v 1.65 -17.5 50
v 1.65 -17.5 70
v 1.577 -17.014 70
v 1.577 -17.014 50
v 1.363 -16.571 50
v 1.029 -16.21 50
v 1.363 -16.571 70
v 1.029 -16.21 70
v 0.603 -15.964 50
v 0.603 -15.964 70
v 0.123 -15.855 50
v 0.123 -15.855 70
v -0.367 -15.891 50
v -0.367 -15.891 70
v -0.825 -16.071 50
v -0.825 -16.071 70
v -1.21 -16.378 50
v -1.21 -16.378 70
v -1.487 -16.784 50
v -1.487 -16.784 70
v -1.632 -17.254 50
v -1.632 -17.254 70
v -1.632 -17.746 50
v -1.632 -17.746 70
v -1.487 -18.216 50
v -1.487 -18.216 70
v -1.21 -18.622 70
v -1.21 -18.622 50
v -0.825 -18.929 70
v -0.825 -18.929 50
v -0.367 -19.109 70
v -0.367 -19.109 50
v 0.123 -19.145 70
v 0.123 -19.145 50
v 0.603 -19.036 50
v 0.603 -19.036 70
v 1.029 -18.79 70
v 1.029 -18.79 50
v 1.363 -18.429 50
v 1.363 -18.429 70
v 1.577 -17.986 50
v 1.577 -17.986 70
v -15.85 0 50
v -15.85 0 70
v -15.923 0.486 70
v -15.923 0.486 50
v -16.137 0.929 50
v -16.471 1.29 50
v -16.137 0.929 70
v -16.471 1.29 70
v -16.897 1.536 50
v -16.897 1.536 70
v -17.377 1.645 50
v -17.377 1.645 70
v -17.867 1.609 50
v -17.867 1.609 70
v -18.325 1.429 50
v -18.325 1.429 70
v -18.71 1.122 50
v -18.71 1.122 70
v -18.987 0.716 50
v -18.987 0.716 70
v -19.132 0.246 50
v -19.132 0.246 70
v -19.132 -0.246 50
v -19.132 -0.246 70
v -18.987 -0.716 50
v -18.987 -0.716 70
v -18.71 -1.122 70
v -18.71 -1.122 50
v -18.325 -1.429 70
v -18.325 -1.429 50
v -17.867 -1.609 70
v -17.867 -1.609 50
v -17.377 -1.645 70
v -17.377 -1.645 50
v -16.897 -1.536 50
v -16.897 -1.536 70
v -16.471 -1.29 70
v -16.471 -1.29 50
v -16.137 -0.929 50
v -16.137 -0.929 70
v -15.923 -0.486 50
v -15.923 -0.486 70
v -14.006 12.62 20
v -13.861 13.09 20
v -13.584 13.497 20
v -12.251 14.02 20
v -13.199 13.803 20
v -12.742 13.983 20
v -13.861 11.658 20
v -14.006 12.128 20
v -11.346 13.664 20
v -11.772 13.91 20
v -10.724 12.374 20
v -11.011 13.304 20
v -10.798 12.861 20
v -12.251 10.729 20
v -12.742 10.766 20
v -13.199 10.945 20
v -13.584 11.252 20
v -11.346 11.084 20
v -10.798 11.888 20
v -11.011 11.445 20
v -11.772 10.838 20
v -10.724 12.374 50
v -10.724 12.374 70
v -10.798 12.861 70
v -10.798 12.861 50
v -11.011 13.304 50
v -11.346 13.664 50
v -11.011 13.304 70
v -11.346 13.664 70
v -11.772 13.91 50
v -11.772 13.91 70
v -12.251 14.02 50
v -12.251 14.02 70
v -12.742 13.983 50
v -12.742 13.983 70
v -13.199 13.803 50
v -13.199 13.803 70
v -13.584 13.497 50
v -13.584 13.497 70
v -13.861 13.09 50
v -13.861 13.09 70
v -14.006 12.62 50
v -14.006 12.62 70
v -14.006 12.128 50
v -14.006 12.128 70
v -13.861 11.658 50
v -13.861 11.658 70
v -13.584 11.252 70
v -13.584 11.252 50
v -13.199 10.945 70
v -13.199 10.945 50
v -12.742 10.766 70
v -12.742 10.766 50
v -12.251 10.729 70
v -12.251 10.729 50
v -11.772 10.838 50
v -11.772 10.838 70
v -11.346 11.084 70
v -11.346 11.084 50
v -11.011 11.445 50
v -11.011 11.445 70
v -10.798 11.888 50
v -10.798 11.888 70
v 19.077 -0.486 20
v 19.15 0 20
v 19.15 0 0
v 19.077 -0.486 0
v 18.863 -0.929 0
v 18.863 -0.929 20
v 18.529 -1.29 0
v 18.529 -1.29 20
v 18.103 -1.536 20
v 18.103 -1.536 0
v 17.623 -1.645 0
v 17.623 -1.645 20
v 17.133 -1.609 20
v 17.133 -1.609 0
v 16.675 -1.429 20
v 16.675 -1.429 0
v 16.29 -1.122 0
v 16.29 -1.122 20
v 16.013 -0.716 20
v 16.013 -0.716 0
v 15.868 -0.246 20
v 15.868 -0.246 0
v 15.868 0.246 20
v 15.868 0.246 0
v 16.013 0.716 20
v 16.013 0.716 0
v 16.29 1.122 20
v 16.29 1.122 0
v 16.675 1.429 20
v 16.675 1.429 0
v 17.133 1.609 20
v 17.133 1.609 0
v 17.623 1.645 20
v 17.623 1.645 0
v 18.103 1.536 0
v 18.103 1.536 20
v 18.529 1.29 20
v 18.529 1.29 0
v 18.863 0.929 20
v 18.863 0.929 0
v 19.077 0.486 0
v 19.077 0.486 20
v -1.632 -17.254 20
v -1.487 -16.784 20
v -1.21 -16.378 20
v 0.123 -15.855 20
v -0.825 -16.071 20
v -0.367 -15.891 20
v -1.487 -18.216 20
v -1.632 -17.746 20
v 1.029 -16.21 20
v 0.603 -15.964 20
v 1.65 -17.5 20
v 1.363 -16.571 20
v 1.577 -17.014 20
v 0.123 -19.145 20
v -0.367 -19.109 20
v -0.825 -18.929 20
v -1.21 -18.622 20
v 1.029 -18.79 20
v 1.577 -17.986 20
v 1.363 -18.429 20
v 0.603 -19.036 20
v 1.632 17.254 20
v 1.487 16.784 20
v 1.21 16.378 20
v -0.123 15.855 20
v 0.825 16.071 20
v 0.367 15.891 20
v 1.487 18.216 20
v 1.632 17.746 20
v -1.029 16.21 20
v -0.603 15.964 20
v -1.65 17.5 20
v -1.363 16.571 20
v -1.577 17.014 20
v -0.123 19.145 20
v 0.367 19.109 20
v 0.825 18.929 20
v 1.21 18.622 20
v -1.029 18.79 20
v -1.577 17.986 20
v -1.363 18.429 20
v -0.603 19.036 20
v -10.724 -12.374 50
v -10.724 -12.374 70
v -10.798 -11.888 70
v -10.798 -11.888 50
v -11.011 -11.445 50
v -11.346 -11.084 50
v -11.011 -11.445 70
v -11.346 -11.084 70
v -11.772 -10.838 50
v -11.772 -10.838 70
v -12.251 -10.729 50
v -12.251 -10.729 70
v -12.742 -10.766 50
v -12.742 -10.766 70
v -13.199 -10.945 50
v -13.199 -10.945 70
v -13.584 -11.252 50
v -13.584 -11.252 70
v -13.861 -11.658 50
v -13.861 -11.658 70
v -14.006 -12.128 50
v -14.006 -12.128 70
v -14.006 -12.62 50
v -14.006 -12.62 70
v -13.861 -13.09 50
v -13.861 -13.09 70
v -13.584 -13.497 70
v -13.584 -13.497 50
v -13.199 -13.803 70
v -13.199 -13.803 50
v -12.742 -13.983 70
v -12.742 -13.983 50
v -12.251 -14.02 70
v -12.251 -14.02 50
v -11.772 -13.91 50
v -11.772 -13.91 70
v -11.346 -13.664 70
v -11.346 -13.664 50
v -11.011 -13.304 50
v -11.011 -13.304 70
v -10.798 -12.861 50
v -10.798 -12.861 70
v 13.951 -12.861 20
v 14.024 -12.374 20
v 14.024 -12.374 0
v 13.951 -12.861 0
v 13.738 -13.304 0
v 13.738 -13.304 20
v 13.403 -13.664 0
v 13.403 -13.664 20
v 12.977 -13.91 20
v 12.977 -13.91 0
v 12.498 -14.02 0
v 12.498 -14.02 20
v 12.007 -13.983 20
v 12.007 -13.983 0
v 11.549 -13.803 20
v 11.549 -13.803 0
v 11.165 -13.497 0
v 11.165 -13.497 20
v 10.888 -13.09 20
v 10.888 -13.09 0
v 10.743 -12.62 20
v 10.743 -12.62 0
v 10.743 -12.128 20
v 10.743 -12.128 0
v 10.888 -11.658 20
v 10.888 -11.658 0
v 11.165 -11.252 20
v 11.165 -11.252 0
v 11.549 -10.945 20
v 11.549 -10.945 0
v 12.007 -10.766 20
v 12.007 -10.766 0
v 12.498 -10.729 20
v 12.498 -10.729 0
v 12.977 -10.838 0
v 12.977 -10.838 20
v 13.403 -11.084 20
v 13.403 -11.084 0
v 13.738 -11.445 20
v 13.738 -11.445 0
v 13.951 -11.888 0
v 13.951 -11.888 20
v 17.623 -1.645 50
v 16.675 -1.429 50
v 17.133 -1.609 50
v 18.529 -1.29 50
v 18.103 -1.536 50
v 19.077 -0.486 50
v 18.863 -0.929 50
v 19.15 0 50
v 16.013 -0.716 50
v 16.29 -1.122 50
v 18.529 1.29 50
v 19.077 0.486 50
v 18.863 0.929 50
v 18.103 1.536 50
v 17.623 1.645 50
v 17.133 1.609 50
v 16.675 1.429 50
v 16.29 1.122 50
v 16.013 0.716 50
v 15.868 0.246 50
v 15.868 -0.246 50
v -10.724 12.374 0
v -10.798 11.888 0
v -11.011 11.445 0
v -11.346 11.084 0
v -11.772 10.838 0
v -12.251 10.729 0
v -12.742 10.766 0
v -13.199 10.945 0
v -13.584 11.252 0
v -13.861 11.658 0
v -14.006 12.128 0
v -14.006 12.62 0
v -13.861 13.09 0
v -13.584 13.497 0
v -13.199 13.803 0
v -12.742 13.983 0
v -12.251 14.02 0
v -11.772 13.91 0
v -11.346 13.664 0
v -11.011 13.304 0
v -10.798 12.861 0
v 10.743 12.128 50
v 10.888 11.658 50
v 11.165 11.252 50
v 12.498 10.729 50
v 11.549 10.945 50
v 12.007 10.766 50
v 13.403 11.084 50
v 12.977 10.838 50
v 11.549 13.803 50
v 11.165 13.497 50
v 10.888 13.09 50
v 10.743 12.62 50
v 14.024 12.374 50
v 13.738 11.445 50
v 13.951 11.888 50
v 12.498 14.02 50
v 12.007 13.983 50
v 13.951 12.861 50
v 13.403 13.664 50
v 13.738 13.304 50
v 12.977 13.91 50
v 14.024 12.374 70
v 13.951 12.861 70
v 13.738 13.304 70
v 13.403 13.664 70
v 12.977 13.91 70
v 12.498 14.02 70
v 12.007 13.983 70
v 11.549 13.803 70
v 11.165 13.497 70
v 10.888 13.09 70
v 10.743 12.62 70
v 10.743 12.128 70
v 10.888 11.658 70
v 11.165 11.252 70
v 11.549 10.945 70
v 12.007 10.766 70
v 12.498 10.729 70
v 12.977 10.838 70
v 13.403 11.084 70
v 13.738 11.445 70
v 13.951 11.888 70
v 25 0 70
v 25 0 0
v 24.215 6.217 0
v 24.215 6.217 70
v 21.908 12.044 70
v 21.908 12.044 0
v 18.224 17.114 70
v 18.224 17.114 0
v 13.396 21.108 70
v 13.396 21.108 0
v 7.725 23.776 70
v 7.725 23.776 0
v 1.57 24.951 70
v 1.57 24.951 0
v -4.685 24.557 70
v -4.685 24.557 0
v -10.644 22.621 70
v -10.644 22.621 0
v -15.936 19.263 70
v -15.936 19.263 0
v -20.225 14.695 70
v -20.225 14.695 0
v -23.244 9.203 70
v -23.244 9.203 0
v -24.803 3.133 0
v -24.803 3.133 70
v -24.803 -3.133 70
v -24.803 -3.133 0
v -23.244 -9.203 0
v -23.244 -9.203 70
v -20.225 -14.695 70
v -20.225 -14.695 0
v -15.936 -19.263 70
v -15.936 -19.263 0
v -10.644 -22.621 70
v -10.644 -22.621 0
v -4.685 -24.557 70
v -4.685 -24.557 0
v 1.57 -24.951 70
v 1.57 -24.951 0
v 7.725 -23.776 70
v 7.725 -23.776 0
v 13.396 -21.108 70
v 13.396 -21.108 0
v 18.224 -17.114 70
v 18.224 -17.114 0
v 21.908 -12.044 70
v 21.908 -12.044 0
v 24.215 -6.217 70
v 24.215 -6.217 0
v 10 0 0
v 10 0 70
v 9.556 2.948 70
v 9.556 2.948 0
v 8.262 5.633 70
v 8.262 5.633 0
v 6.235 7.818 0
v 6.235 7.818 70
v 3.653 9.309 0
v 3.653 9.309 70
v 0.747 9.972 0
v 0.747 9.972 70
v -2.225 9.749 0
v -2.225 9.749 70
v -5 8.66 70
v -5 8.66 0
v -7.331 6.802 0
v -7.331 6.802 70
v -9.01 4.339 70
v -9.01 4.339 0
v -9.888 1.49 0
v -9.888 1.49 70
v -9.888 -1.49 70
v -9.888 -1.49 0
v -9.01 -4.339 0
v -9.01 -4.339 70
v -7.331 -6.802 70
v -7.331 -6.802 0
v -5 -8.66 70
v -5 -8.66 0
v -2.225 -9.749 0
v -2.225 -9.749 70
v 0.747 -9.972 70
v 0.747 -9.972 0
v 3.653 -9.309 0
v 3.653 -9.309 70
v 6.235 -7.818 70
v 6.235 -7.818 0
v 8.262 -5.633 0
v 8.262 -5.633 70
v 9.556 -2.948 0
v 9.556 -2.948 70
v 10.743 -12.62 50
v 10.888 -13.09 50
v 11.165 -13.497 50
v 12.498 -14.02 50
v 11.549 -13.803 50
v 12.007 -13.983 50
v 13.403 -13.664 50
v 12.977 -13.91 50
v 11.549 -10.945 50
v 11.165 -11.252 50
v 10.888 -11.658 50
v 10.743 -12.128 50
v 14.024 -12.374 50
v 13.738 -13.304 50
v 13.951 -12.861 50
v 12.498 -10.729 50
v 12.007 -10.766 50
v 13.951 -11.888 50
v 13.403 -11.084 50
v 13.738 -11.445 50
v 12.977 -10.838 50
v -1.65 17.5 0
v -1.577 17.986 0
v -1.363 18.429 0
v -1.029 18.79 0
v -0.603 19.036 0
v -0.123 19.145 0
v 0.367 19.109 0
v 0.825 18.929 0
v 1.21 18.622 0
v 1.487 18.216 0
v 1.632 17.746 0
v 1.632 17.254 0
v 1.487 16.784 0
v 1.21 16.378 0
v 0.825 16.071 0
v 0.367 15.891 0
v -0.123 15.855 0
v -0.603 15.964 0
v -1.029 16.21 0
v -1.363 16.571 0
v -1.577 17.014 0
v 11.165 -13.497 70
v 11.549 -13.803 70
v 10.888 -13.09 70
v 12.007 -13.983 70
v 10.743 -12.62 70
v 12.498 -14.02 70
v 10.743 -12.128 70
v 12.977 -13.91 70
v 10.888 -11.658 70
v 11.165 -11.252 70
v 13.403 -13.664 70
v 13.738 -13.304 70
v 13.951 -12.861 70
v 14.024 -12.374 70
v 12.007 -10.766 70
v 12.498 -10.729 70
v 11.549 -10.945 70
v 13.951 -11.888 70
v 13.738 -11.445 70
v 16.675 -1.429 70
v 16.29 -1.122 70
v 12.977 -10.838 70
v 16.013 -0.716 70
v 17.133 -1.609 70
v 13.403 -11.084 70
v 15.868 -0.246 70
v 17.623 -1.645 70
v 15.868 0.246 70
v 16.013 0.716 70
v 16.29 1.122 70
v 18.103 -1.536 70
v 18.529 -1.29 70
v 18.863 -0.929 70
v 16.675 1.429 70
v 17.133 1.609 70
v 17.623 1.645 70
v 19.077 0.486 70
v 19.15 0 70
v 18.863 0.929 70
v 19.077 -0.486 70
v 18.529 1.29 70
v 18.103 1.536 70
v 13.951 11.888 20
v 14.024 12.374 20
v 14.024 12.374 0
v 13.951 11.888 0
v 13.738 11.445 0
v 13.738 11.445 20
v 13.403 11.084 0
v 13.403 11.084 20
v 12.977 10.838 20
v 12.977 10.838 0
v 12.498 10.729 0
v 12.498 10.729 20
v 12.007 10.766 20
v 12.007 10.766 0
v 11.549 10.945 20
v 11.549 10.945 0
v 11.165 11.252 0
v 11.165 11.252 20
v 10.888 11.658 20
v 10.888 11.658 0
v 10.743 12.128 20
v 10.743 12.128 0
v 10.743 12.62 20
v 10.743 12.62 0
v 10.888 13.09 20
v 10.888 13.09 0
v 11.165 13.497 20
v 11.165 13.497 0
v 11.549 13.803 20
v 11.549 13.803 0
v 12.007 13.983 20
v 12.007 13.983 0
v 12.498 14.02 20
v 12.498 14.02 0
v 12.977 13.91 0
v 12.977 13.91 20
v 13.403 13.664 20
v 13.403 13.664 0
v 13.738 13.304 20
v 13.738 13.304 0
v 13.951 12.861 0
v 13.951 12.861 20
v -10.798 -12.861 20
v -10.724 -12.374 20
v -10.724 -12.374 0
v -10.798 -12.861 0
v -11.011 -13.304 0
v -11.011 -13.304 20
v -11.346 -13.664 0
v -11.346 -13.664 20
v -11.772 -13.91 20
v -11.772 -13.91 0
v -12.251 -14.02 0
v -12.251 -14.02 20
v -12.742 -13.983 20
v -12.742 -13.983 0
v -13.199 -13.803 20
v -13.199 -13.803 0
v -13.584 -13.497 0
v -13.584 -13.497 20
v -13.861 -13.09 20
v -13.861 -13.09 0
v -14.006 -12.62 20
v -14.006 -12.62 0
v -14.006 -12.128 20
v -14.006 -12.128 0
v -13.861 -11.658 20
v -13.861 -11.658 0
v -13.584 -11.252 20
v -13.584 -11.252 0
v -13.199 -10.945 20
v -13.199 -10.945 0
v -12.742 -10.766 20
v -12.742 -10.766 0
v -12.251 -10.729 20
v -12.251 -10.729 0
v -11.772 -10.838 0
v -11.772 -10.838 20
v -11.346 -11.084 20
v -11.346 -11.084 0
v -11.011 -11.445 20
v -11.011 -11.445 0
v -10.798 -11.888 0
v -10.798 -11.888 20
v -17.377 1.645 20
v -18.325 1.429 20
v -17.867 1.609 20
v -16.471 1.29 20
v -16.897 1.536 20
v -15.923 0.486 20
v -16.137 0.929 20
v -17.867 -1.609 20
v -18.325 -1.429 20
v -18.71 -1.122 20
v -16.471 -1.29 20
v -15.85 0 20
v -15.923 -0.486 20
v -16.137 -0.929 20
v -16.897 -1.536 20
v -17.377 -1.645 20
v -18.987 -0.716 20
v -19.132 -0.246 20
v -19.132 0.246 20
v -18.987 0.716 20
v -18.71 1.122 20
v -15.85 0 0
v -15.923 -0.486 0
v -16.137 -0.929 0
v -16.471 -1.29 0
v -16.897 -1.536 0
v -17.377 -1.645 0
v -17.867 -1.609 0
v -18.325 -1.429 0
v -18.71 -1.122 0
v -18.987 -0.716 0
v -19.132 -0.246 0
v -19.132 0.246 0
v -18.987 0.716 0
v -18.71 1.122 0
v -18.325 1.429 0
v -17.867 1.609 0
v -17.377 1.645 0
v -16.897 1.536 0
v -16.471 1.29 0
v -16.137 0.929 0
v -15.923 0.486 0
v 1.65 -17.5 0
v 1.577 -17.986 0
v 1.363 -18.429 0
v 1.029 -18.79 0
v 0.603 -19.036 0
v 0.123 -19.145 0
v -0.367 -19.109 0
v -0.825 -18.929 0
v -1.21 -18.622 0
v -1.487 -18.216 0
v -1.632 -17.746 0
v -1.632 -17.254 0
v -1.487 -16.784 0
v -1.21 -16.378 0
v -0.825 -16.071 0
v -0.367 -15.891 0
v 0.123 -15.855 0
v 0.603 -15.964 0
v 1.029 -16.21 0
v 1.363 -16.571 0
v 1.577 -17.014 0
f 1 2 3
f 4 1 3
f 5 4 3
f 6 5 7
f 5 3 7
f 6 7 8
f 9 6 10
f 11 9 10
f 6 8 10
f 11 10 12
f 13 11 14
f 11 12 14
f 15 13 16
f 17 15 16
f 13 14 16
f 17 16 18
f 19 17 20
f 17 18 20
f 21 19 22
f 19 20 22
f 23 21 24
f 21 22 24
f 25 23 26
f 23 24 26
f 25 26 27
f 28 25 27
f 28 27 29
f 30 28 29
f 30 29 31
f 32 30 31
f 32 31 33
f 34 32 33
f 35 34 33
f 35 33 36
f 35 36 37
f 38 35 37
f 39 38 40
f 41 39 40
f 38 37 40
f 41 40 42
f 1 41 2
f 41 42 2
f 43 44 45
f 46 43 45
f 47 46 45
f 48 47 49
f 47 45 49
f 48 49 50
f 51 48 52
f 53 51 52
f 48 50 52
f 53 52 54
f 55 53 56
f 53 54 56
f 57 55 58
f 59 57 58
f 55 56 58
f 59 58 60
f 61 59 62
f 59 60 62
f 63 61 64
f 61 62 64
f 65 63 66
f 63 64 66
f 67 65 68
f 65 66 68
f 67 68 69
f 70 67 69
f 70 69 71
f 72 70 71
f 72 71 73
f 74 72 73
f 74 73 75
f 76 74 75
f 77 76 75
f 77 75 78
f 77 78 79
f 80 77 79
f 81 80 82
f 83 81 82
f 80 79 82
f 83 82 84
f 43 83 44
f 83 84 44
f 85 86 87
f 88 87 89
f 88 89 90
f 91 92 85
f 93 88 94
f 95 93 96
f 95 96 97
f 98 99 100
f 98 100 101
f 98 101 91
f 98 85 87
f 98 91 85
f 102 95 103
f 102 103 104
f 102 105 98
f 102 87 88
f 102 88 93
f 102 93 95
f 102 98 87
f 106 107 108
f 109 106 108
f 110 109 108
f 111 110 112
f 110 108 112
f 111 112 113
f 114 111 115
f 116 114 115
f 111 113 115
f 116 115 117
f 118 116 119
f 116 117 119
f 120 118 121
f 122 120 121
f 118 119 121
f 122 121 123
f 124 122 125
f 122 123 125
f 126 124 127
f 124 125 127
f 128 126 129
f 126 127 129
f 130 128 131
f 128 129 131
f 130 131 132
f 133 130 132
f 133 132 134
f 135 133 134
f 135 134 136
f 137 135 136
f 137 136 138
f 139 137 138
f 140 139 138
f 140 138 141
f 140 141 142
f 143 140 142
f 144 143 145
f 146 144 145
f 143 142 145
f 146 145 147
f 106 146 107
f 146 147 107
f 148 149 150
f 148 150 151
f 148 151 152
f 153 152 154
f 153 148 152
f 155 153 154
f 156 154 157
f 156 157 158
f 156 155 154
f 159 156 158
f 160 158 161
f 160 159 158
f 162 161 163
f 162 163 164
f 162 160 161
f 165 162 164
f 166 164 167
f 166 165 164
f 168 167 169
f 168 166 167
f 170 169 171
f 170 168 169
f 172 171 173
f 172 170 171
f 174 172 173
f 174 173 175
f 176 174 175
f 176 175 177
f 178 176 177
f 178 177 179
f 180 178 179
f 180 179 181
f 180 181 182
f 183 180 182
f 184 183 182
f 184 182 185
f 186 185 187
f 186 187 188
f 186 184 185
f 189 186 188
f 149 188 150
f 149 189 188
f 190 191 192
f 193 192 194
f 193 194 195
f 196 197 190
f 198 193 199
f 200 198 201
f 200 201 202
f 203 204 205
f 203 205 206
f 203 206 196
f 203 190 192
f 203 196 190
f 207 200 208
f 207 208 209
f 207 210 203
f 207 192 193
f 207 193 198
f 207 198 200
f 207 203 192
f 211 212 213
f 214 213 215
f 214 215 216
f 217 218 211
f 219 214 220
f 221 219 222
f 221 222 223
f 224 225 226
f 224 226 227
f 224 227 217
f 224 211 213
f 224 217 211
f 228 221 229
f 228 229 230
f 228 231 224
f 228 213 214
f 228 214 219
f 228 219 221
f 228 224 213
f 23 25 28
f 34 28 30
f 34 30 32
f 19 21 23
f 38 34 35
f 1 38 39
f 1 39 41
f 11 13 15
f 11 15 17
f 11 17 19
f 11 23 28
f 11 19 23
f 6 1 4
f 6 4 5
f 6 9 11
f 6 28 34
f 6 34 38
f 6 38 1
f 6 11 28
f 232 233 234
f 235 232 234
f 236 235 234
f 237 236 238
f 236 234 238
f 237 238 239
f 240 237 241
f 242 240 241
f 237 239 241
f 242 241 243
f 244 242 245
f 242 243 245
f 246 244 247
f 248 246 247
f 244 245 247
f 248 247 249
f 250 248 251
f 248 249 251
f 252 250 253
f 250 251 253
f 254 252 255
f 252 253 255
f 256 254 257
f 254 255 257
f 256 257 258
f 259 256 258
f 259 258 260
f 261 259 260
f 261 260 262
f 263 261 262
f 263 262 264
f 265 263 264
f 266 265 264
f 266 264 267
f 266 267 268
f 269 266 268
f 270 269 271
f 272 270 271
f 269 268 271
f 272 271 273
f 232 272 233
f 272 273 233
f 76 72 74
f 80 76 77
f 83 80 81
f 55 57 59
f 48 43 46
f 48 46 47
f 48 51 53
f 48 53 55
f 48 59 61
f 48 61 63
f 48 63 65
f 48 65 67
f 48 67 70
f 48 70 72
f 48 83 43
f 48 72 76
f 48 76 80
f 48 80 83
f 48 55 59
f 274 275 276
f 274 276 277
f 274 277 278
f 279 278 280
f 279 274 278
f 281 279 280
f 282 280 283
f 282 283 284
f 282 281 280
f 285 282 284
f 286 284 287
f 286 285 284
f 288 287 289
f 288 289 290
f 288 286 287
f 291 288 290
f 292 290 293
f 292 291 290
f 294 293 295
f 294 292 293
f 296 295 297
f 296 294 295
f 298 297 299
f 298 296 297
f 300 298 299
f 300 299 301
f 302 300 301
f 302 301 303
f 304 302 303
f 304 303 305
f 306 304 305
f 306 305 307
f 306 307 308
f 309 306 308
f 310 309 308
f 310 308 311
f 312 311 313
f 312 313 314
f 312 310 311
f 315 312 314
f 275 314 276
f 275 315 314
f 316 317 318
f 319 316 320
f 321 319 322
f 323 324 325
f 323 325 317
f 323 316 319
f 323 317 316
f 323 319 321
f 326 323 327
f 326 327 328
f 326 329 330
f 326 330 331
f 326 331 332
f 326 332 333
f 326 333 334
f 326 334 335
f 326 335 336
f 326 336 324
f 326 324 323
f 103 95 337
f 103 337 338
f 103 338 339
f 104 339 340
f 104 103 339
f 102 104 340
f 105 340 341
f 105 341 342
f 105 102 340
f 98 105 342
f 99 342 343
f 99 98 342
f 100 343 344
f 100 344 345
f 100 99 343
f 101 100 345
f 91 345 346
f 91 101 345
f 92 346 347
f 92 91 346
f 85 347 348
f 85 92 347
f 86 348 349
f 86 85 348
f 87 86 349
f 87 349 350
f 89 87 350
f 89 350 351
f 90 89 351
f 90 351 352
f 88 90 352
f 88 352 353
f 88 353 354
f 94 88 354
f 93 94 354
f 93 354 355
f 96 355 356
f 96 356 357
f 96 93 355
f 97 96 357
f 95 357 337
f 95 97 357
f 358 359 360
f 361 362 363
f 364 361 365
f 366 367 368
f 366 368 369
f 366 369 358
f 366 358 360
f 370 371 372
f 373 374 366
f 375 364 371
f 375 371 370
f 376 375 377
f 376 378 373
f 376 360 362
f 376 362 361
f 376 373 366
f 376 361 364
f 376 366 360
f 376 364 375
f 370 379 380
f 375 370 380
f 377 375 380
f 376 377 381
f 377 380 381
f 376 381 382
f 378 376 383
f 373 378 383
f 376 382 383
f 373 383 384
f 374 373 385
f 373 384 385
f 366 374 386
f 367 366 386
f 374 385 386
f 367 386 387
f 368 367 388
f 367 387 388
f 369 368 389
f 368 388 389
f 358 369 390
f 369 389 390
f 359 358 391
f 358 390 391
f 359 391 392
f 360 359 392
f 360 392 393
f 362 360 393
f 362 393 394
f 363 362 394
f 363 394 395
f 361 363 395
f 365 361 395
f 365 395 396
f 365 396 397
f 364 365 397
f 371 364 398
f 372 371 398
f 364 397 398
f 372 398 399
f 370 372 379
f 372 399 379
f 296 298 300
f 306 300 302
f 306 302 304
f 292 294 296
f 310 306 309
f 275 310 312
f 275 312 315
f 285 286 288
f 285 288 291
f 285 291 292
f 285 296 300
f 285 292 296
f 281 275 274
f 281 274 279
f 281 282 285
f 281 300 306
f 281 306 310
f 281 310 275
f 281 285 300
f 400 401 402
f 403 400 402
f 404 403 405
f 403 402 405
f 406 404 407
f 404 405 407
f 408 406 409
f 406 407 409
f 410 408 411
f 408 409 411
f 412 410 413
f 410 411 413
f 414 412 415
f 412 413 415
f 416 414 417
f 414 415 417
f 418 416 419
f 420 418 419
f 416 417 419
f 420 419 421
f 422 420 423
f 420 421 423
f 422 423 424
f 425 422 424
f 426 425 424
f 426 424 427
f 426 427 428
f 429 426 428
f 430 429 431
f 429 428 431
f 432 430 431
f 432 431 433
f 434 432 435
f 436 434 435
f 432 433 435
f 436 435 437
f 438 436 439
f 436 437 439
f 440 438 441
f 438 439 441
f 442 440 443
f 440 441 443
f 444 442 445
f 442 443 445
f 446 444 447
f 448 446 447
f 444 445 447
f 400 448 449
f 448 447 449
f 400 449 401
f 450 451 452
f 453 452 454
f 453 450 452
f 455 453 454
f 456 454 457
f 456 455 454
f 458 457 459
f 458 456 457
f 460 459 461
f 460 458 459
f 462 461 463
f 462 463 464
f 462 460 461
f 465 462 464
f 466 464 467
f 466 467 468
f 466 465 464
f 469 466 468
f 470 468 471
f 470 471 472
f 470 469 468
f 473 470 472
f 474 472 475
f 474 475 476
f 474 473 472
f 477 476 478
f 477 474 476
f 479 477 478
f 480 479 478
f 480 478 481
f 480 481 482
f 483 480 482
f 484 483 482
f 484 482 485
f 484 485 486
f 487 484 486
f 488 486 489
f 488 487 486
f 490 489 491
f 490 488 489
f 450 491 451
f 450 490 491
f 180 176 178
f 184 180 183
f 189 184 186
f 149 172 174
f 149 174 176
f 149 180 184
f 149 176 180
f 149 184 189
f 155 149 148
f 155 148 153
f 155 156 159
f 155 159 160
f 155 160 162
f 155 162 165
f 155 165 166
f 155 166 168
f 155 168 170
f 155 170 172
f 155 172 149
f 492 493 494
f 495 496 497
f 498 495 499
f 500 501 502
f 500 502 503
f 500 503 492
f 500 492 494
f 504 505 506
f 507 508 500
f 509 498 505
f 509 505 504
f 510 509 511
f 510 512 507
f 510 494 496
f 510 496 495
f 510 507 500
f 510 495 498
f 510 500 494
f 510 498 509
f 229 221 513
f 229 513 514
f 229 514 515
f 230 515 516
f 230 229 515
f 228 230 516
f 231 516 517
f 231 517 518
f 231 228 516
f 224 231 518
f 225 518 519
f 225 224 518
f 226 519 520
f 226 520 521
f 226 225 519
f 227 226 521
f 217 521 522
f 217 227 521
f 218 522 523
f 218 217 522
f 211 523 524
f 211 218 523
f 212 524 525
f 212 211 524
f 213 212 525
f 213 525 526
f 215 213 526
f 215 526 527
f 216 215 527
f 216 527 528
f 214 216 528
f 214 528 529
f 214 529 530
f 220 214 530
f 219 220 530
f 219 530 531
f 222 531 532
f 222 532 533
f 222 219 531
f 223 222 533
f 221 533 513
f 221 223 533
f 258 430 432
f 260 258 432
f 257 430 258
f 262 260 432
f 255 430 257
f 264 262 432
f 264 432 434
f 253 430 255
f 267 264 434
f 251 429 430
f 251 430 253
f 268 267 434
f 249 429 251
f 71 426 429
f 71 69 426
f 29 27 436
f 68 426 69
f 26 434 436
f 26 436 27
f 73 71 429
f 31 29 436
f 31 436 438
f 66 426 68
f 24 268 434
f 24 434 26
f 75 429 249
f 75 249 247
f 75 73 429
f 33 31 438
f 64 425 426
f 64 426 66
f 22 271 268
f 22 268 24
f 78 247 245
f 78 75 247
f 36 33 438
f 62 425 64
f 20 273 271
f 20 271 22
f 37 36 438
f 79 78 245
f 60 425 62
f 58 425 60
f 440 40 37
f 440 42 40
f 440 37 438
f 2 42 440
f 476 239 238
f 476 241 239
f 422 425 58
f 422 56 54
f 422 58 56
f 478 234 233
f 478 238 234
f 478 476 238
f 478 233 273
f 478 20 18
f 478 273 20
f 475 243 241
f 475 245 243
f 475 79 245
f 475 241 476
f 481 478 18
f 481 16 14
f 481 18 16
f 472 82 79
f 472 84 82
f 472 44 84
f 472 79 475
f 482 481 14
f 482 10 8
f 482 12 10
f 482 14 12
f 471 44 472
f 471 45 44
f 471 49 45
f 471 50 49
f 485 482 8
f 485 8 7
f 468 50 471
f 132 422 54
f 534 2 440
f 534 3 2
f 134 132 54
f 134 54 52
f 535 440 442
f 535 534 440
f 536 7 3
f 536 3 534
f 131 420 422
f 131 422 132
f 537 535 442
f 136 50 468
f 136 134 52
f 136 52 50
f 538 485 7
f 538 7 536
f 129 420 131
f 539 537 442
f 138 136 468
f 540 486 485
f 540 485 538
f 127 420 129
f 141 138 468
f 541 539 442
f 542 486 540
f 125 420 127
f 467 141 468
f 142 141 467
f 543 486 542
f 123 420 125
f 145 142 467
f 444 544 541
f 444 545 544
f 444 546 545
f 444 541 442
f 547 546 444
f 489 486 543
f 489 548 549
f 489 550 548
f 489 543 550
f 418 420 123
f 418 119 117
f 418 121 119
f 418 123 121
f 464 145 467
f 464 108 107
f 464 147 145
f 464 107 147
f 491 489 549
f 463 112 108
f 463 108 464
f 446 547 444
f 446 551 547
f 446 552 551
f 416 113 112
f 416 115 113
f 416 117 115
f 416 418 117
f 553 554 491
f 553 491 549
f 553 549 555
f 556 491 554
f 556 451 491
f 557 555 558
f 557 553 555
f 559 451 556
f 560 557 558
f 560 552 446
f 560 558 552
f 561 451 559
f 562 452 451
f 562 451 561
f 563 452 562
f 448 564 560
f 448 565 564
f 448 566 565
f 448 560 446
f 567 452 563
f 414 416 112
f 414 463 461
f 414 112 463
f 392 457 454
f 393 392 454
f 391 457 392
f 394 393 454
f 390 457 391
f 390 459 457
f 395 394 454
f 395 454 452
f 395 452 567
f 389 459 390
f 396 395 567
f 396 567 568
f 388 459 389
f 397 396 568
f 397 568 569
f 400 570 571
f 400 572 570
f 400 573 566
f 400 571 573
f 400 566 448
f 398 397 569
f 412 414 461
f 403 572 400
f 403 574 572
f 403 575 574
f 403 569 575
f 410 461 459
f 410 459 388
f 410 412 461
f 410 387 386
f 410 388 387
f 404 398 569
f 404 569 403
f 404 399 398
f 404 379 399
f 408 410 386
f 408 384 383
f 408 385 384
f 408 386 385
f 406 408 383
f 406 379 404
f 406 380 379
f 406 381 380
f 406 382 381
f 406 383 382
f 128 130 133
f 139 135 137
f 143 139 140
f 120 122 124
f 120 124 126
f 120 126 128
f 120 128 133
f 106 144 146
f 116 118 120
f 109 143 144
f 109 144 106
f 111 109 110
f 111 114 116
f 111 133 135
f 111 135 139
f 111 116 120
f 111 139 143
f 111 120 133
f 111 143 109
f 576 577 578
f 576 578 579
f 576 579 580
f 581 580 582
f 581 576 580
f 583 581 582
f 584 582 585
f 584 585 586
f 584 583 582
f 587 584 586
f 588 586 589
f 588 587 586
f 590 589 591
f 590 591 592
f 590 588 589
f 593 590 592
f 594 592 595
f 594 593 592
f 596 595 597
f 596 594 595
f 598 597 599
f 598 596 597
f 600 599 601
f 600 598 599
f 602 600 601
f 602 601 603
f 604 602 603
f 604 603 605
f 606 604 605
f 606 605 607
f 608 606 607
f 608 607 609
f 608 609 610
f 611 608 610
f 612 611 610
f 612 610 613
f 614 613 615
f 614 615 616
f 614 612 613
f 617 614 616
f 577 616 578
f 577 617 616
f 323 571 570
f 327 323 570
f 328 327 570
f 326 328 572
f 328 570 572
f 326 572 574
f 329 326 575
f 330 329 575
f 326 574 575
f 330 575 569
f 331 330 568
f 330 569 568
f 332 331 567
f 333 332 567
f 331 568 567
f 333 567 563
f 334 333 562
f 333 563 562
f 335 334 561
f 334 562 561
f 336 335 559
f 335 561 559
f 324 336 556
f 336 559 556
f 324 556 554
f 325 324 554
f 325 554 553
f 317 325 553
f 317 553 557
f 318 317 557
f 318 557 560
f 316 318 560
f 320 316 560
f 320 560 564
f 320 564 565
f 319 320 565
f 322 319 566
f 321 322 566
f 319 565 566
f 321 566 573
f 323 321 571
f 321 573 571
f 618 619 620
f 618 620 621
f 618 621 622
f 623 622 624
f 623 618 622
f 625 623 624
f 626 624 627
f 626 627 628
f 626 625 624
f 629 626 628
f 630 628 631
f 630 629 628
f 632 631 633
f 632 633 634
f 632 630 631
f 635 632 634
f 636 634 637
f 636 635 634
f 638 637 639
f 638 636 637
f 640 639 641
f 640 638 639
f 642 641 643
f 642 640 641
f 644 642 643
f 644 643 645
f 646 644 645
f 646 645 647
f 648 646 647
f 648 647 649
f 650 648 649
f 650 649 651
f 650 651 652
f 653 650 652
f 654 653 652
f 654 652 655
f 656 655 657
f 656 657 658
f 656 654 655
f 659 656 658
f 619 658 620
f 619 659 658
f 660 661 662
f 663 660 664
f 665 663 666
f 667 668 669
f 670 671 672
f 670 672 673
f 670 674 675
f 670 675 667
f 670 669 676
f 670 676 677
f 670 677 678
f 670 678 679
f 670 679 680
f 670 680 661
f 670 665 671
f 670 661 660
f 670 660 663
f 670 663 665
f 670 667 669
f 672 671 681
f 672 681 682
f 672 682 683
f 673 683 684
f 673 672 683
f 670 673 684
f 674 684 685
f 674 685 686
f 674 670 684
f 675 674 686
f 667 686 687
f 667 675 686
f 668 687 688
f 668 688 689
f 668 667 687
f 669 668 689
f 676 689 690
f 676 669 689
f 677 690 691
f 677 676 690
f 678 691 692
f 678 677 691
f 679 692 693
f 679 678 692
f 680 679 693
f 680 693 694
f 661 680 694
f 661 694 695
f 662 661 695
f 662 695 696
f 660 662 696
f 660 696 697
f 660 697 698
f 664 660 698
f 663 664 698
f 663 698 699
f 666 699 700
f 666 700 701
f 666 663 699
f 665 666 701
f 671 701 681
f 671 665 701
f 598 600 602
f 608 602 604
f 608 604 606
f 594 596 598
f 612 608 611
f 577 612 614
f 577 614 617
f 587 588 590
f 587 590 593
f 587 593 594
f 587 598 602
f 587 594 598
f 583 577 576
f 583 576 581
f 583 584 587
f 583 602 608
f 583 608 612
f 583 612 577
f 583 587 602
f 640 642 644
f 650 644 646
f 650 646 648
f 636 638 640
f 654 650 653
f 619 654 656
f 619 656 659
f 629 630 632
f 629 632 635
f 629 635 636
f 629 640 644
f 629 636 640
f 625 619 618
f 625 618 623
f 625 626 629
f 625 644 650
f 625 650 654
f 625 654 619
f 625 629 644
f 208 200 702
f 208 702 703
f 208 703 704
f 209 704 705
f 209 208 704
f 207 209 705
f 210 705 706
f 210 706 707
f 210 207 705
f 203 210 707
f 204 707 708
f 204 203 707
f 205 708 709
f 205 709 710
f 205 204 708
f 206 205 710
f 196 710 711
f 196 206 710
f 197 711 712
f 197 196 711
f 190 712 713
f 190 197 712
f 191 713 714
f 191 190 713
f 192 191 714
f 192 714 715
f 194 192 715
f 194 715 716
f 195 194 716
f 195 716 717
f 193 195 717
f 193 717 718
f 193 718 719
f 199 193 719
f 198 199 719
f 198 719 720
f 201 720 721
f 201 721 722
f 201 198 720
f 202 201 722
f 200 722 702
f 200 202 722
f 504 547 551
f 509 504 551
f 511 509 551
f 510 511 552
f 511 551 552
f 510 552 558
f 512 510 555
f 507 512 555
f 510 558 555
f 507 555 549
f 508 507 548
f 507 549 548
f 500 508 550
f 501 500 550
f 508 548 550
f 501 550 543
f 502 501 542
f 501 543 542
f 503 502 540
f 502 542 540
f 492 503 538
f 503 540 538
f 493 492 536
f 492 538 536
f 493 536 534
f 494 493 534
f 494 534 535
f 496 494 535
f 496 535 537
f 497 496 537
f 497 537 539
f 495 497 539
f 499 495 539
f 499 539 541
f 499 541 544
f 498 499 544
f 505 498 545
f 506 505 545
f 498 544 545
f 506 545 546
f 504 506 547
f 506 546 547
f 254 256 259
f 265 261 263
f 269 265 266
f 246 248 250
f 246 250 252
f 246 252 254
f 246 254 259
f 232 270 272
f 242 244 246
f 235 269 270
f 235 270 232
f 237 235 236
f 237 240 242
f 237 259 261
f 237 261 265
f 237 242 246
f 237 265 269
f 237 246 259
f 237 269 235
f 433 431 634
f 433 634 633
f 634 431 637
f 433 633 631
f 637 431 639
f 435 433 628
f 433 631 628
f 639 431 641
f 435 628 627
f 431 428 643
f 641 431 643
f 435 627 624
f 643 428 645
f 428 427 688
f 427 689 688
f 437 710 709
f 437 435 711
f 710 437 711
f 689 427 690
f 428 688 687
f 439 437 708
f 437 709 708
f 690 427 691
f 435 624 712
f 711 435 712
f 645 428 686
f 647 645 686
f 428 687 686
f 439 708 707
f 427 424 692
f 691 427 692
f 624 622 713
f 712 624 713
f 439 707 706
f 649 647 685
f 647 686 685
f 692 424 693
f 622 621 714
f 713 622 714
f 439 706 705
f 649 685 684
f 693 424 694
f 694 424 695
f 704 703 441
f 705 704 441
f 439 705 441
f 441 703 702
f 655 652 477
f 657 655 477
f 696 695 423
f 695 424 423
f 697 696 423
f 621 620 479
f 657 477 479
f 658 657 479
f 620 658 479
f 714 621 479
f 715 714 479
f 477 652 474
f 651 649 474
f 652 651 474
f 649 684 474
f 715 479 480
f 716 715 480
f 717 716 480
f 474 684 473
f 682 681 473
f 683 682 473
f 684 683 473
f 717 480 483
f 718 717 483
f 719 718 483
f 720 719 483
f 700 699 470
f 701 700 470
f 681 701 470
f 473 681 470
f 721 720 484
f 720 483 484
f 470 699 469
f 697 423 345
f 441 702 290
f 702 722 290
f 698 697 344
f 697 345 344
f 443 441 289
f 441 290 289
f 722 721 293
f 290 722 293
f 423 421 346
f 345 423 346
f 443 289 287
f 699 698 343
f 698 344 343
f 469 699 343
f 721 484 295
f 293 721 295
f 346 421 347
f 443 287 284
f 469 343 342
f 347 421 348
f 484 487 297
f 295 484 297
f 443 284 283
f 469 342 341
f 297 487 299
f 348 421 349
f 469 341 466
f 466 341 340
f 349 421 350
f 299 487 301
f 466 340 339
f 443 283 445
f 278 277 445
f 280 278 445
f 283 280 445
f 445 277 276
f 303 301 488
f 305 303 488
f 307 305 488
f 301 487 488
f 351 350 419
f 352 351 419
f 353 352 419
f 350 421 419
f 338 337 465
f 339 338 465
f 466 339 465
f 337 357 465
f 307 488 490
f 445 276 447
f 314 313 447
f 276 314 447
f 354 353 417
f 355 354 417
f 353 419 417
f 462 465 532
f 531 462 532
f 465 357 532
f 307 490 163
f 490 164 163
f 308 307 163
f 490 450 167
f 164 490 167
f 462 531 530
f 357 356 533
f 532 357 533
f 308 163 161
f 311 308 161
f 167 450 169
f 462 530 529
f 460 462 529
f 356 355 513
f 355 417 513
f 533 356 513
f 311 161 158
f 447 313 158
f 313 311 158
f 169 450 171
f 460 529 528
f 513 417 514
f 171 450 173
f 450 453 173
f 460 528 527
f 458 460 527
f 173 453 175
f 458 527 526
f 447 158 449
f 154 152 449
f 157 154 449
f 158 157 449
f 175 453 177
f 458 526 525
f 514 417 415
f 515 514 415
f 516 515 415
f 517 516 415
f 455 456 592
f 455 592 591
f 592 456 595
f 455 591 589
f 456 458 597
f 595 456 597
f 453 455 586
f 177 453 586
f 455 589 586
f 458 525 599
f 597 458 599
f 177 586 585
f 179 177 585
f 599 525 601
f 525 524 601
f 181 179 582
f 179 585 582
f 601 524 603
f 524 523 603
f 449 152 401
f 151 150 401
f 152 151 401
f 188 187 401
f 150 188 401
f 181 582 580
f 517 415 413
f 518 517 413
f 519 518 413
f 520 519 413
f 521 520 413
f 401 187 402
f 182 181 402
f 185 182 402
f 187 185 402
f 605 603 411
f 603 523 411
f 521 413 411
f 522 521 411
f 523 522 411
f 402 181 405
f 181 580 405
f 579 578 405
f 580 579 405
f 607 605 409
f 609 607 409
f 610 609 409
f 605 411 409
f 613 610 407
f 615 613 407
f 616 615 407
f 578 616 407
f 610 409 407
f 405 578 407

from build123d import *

# Parameters (mm, degrees)
SKETCH1_R           = 25
SKETCH1_R_2         = 10
BOSS_EXTRUDE1_DEPTH = 70
SKETCH3_R           = 1.65
CUT_EXTRUDE1_DEPTH  = 20
CUT_EXTRUDE2_START  = -20
SKETCH4_R           = 1.65
CUT_EXTRUDE2_DEPTH  = 20


with BuildPart() as part:
    # Sketch1 → Boss-Extrude1 (new body)
    with BuildSketch(Plane.XY):
        Circle(SKETCH1_R)
        Circle(SKETCH1_R_2, mode=Mode.SUBTRACT)
    extrude(amount=BOSS_EXTRUDE1_DEPTH)

    # Sketch3 → Cut-Extrude1 (cut)
    with BuildSketch(Plane.XY.offset(70)):
        with Locations((12.374368671, 12.374368671)):
            Circle(SKETCH3_R)
        with Locations((17.5, 0)):
            Circle(SKETCH3_R)
        with Locations((12.374368671, -12.374368671)):
            Circle(SKETCH3_R)
        with Locations((0, -17.5)):
            Circle(SKETCH3_R)
        with Locations((-12.374368671, -12.374368671)):
            Circle(SKETCH3_R)
        with Locations((-17.5, 0)):
            Circle(SKETCH3_R)
        with Locations((-12.374368671, 12.374368671)):
            Circle(SKETCH3_R)
    extrude(amount=-CUT_EXTRUDE1_DEPTH, mode=Mode.SUBTRACT)

    # Sketch4 → Cut-Extrude2 (cut)
    with BuildSketch(Plane(origin=(0, 0, 0), x_dir=(-1, 0, 0), z_dir=(0, 0, -1)).offset(CUT_EXTRUDE2_START)):
        with Locations((0, 17.5)):
            Circle(SKETCH4_R)
        with Locations(Location((12.374368671, 12.374368671, 0), (0, 0, 180))):
            Circle(SKETCH4_R)
        with Locations(Location((17.5, 0, 0), (0, 0, 180))):
            Circle(SKETCH4_R)
        with Locations(Location((12.374368671, -12.374368671, 0), (0, 0, 180))):
            Circle(SKETCH4_R)
        with Locations(Location((0, -17.5, 0), (0, 0, 180))):
            Circle(SKETCH4_R)
        with Locations(Location((-12.374368671, -12.374368671, 0), (0, 0, 180))):
            Circle(SKETCH4_R)
        with Locations(Location((-17.5, 0, 0), (0, 0, 180))):
            Circle(SKETCH4_R)
        with Locations(Location((-12.374368671, 12.374368671, 0), (0, 0, 180))):
            Circle(SKETCH4_R)
    extrude(amount=CUT_EXTRUDE2_DEPTH, mode=Mode.SUBTRACT)


solid = part.part
